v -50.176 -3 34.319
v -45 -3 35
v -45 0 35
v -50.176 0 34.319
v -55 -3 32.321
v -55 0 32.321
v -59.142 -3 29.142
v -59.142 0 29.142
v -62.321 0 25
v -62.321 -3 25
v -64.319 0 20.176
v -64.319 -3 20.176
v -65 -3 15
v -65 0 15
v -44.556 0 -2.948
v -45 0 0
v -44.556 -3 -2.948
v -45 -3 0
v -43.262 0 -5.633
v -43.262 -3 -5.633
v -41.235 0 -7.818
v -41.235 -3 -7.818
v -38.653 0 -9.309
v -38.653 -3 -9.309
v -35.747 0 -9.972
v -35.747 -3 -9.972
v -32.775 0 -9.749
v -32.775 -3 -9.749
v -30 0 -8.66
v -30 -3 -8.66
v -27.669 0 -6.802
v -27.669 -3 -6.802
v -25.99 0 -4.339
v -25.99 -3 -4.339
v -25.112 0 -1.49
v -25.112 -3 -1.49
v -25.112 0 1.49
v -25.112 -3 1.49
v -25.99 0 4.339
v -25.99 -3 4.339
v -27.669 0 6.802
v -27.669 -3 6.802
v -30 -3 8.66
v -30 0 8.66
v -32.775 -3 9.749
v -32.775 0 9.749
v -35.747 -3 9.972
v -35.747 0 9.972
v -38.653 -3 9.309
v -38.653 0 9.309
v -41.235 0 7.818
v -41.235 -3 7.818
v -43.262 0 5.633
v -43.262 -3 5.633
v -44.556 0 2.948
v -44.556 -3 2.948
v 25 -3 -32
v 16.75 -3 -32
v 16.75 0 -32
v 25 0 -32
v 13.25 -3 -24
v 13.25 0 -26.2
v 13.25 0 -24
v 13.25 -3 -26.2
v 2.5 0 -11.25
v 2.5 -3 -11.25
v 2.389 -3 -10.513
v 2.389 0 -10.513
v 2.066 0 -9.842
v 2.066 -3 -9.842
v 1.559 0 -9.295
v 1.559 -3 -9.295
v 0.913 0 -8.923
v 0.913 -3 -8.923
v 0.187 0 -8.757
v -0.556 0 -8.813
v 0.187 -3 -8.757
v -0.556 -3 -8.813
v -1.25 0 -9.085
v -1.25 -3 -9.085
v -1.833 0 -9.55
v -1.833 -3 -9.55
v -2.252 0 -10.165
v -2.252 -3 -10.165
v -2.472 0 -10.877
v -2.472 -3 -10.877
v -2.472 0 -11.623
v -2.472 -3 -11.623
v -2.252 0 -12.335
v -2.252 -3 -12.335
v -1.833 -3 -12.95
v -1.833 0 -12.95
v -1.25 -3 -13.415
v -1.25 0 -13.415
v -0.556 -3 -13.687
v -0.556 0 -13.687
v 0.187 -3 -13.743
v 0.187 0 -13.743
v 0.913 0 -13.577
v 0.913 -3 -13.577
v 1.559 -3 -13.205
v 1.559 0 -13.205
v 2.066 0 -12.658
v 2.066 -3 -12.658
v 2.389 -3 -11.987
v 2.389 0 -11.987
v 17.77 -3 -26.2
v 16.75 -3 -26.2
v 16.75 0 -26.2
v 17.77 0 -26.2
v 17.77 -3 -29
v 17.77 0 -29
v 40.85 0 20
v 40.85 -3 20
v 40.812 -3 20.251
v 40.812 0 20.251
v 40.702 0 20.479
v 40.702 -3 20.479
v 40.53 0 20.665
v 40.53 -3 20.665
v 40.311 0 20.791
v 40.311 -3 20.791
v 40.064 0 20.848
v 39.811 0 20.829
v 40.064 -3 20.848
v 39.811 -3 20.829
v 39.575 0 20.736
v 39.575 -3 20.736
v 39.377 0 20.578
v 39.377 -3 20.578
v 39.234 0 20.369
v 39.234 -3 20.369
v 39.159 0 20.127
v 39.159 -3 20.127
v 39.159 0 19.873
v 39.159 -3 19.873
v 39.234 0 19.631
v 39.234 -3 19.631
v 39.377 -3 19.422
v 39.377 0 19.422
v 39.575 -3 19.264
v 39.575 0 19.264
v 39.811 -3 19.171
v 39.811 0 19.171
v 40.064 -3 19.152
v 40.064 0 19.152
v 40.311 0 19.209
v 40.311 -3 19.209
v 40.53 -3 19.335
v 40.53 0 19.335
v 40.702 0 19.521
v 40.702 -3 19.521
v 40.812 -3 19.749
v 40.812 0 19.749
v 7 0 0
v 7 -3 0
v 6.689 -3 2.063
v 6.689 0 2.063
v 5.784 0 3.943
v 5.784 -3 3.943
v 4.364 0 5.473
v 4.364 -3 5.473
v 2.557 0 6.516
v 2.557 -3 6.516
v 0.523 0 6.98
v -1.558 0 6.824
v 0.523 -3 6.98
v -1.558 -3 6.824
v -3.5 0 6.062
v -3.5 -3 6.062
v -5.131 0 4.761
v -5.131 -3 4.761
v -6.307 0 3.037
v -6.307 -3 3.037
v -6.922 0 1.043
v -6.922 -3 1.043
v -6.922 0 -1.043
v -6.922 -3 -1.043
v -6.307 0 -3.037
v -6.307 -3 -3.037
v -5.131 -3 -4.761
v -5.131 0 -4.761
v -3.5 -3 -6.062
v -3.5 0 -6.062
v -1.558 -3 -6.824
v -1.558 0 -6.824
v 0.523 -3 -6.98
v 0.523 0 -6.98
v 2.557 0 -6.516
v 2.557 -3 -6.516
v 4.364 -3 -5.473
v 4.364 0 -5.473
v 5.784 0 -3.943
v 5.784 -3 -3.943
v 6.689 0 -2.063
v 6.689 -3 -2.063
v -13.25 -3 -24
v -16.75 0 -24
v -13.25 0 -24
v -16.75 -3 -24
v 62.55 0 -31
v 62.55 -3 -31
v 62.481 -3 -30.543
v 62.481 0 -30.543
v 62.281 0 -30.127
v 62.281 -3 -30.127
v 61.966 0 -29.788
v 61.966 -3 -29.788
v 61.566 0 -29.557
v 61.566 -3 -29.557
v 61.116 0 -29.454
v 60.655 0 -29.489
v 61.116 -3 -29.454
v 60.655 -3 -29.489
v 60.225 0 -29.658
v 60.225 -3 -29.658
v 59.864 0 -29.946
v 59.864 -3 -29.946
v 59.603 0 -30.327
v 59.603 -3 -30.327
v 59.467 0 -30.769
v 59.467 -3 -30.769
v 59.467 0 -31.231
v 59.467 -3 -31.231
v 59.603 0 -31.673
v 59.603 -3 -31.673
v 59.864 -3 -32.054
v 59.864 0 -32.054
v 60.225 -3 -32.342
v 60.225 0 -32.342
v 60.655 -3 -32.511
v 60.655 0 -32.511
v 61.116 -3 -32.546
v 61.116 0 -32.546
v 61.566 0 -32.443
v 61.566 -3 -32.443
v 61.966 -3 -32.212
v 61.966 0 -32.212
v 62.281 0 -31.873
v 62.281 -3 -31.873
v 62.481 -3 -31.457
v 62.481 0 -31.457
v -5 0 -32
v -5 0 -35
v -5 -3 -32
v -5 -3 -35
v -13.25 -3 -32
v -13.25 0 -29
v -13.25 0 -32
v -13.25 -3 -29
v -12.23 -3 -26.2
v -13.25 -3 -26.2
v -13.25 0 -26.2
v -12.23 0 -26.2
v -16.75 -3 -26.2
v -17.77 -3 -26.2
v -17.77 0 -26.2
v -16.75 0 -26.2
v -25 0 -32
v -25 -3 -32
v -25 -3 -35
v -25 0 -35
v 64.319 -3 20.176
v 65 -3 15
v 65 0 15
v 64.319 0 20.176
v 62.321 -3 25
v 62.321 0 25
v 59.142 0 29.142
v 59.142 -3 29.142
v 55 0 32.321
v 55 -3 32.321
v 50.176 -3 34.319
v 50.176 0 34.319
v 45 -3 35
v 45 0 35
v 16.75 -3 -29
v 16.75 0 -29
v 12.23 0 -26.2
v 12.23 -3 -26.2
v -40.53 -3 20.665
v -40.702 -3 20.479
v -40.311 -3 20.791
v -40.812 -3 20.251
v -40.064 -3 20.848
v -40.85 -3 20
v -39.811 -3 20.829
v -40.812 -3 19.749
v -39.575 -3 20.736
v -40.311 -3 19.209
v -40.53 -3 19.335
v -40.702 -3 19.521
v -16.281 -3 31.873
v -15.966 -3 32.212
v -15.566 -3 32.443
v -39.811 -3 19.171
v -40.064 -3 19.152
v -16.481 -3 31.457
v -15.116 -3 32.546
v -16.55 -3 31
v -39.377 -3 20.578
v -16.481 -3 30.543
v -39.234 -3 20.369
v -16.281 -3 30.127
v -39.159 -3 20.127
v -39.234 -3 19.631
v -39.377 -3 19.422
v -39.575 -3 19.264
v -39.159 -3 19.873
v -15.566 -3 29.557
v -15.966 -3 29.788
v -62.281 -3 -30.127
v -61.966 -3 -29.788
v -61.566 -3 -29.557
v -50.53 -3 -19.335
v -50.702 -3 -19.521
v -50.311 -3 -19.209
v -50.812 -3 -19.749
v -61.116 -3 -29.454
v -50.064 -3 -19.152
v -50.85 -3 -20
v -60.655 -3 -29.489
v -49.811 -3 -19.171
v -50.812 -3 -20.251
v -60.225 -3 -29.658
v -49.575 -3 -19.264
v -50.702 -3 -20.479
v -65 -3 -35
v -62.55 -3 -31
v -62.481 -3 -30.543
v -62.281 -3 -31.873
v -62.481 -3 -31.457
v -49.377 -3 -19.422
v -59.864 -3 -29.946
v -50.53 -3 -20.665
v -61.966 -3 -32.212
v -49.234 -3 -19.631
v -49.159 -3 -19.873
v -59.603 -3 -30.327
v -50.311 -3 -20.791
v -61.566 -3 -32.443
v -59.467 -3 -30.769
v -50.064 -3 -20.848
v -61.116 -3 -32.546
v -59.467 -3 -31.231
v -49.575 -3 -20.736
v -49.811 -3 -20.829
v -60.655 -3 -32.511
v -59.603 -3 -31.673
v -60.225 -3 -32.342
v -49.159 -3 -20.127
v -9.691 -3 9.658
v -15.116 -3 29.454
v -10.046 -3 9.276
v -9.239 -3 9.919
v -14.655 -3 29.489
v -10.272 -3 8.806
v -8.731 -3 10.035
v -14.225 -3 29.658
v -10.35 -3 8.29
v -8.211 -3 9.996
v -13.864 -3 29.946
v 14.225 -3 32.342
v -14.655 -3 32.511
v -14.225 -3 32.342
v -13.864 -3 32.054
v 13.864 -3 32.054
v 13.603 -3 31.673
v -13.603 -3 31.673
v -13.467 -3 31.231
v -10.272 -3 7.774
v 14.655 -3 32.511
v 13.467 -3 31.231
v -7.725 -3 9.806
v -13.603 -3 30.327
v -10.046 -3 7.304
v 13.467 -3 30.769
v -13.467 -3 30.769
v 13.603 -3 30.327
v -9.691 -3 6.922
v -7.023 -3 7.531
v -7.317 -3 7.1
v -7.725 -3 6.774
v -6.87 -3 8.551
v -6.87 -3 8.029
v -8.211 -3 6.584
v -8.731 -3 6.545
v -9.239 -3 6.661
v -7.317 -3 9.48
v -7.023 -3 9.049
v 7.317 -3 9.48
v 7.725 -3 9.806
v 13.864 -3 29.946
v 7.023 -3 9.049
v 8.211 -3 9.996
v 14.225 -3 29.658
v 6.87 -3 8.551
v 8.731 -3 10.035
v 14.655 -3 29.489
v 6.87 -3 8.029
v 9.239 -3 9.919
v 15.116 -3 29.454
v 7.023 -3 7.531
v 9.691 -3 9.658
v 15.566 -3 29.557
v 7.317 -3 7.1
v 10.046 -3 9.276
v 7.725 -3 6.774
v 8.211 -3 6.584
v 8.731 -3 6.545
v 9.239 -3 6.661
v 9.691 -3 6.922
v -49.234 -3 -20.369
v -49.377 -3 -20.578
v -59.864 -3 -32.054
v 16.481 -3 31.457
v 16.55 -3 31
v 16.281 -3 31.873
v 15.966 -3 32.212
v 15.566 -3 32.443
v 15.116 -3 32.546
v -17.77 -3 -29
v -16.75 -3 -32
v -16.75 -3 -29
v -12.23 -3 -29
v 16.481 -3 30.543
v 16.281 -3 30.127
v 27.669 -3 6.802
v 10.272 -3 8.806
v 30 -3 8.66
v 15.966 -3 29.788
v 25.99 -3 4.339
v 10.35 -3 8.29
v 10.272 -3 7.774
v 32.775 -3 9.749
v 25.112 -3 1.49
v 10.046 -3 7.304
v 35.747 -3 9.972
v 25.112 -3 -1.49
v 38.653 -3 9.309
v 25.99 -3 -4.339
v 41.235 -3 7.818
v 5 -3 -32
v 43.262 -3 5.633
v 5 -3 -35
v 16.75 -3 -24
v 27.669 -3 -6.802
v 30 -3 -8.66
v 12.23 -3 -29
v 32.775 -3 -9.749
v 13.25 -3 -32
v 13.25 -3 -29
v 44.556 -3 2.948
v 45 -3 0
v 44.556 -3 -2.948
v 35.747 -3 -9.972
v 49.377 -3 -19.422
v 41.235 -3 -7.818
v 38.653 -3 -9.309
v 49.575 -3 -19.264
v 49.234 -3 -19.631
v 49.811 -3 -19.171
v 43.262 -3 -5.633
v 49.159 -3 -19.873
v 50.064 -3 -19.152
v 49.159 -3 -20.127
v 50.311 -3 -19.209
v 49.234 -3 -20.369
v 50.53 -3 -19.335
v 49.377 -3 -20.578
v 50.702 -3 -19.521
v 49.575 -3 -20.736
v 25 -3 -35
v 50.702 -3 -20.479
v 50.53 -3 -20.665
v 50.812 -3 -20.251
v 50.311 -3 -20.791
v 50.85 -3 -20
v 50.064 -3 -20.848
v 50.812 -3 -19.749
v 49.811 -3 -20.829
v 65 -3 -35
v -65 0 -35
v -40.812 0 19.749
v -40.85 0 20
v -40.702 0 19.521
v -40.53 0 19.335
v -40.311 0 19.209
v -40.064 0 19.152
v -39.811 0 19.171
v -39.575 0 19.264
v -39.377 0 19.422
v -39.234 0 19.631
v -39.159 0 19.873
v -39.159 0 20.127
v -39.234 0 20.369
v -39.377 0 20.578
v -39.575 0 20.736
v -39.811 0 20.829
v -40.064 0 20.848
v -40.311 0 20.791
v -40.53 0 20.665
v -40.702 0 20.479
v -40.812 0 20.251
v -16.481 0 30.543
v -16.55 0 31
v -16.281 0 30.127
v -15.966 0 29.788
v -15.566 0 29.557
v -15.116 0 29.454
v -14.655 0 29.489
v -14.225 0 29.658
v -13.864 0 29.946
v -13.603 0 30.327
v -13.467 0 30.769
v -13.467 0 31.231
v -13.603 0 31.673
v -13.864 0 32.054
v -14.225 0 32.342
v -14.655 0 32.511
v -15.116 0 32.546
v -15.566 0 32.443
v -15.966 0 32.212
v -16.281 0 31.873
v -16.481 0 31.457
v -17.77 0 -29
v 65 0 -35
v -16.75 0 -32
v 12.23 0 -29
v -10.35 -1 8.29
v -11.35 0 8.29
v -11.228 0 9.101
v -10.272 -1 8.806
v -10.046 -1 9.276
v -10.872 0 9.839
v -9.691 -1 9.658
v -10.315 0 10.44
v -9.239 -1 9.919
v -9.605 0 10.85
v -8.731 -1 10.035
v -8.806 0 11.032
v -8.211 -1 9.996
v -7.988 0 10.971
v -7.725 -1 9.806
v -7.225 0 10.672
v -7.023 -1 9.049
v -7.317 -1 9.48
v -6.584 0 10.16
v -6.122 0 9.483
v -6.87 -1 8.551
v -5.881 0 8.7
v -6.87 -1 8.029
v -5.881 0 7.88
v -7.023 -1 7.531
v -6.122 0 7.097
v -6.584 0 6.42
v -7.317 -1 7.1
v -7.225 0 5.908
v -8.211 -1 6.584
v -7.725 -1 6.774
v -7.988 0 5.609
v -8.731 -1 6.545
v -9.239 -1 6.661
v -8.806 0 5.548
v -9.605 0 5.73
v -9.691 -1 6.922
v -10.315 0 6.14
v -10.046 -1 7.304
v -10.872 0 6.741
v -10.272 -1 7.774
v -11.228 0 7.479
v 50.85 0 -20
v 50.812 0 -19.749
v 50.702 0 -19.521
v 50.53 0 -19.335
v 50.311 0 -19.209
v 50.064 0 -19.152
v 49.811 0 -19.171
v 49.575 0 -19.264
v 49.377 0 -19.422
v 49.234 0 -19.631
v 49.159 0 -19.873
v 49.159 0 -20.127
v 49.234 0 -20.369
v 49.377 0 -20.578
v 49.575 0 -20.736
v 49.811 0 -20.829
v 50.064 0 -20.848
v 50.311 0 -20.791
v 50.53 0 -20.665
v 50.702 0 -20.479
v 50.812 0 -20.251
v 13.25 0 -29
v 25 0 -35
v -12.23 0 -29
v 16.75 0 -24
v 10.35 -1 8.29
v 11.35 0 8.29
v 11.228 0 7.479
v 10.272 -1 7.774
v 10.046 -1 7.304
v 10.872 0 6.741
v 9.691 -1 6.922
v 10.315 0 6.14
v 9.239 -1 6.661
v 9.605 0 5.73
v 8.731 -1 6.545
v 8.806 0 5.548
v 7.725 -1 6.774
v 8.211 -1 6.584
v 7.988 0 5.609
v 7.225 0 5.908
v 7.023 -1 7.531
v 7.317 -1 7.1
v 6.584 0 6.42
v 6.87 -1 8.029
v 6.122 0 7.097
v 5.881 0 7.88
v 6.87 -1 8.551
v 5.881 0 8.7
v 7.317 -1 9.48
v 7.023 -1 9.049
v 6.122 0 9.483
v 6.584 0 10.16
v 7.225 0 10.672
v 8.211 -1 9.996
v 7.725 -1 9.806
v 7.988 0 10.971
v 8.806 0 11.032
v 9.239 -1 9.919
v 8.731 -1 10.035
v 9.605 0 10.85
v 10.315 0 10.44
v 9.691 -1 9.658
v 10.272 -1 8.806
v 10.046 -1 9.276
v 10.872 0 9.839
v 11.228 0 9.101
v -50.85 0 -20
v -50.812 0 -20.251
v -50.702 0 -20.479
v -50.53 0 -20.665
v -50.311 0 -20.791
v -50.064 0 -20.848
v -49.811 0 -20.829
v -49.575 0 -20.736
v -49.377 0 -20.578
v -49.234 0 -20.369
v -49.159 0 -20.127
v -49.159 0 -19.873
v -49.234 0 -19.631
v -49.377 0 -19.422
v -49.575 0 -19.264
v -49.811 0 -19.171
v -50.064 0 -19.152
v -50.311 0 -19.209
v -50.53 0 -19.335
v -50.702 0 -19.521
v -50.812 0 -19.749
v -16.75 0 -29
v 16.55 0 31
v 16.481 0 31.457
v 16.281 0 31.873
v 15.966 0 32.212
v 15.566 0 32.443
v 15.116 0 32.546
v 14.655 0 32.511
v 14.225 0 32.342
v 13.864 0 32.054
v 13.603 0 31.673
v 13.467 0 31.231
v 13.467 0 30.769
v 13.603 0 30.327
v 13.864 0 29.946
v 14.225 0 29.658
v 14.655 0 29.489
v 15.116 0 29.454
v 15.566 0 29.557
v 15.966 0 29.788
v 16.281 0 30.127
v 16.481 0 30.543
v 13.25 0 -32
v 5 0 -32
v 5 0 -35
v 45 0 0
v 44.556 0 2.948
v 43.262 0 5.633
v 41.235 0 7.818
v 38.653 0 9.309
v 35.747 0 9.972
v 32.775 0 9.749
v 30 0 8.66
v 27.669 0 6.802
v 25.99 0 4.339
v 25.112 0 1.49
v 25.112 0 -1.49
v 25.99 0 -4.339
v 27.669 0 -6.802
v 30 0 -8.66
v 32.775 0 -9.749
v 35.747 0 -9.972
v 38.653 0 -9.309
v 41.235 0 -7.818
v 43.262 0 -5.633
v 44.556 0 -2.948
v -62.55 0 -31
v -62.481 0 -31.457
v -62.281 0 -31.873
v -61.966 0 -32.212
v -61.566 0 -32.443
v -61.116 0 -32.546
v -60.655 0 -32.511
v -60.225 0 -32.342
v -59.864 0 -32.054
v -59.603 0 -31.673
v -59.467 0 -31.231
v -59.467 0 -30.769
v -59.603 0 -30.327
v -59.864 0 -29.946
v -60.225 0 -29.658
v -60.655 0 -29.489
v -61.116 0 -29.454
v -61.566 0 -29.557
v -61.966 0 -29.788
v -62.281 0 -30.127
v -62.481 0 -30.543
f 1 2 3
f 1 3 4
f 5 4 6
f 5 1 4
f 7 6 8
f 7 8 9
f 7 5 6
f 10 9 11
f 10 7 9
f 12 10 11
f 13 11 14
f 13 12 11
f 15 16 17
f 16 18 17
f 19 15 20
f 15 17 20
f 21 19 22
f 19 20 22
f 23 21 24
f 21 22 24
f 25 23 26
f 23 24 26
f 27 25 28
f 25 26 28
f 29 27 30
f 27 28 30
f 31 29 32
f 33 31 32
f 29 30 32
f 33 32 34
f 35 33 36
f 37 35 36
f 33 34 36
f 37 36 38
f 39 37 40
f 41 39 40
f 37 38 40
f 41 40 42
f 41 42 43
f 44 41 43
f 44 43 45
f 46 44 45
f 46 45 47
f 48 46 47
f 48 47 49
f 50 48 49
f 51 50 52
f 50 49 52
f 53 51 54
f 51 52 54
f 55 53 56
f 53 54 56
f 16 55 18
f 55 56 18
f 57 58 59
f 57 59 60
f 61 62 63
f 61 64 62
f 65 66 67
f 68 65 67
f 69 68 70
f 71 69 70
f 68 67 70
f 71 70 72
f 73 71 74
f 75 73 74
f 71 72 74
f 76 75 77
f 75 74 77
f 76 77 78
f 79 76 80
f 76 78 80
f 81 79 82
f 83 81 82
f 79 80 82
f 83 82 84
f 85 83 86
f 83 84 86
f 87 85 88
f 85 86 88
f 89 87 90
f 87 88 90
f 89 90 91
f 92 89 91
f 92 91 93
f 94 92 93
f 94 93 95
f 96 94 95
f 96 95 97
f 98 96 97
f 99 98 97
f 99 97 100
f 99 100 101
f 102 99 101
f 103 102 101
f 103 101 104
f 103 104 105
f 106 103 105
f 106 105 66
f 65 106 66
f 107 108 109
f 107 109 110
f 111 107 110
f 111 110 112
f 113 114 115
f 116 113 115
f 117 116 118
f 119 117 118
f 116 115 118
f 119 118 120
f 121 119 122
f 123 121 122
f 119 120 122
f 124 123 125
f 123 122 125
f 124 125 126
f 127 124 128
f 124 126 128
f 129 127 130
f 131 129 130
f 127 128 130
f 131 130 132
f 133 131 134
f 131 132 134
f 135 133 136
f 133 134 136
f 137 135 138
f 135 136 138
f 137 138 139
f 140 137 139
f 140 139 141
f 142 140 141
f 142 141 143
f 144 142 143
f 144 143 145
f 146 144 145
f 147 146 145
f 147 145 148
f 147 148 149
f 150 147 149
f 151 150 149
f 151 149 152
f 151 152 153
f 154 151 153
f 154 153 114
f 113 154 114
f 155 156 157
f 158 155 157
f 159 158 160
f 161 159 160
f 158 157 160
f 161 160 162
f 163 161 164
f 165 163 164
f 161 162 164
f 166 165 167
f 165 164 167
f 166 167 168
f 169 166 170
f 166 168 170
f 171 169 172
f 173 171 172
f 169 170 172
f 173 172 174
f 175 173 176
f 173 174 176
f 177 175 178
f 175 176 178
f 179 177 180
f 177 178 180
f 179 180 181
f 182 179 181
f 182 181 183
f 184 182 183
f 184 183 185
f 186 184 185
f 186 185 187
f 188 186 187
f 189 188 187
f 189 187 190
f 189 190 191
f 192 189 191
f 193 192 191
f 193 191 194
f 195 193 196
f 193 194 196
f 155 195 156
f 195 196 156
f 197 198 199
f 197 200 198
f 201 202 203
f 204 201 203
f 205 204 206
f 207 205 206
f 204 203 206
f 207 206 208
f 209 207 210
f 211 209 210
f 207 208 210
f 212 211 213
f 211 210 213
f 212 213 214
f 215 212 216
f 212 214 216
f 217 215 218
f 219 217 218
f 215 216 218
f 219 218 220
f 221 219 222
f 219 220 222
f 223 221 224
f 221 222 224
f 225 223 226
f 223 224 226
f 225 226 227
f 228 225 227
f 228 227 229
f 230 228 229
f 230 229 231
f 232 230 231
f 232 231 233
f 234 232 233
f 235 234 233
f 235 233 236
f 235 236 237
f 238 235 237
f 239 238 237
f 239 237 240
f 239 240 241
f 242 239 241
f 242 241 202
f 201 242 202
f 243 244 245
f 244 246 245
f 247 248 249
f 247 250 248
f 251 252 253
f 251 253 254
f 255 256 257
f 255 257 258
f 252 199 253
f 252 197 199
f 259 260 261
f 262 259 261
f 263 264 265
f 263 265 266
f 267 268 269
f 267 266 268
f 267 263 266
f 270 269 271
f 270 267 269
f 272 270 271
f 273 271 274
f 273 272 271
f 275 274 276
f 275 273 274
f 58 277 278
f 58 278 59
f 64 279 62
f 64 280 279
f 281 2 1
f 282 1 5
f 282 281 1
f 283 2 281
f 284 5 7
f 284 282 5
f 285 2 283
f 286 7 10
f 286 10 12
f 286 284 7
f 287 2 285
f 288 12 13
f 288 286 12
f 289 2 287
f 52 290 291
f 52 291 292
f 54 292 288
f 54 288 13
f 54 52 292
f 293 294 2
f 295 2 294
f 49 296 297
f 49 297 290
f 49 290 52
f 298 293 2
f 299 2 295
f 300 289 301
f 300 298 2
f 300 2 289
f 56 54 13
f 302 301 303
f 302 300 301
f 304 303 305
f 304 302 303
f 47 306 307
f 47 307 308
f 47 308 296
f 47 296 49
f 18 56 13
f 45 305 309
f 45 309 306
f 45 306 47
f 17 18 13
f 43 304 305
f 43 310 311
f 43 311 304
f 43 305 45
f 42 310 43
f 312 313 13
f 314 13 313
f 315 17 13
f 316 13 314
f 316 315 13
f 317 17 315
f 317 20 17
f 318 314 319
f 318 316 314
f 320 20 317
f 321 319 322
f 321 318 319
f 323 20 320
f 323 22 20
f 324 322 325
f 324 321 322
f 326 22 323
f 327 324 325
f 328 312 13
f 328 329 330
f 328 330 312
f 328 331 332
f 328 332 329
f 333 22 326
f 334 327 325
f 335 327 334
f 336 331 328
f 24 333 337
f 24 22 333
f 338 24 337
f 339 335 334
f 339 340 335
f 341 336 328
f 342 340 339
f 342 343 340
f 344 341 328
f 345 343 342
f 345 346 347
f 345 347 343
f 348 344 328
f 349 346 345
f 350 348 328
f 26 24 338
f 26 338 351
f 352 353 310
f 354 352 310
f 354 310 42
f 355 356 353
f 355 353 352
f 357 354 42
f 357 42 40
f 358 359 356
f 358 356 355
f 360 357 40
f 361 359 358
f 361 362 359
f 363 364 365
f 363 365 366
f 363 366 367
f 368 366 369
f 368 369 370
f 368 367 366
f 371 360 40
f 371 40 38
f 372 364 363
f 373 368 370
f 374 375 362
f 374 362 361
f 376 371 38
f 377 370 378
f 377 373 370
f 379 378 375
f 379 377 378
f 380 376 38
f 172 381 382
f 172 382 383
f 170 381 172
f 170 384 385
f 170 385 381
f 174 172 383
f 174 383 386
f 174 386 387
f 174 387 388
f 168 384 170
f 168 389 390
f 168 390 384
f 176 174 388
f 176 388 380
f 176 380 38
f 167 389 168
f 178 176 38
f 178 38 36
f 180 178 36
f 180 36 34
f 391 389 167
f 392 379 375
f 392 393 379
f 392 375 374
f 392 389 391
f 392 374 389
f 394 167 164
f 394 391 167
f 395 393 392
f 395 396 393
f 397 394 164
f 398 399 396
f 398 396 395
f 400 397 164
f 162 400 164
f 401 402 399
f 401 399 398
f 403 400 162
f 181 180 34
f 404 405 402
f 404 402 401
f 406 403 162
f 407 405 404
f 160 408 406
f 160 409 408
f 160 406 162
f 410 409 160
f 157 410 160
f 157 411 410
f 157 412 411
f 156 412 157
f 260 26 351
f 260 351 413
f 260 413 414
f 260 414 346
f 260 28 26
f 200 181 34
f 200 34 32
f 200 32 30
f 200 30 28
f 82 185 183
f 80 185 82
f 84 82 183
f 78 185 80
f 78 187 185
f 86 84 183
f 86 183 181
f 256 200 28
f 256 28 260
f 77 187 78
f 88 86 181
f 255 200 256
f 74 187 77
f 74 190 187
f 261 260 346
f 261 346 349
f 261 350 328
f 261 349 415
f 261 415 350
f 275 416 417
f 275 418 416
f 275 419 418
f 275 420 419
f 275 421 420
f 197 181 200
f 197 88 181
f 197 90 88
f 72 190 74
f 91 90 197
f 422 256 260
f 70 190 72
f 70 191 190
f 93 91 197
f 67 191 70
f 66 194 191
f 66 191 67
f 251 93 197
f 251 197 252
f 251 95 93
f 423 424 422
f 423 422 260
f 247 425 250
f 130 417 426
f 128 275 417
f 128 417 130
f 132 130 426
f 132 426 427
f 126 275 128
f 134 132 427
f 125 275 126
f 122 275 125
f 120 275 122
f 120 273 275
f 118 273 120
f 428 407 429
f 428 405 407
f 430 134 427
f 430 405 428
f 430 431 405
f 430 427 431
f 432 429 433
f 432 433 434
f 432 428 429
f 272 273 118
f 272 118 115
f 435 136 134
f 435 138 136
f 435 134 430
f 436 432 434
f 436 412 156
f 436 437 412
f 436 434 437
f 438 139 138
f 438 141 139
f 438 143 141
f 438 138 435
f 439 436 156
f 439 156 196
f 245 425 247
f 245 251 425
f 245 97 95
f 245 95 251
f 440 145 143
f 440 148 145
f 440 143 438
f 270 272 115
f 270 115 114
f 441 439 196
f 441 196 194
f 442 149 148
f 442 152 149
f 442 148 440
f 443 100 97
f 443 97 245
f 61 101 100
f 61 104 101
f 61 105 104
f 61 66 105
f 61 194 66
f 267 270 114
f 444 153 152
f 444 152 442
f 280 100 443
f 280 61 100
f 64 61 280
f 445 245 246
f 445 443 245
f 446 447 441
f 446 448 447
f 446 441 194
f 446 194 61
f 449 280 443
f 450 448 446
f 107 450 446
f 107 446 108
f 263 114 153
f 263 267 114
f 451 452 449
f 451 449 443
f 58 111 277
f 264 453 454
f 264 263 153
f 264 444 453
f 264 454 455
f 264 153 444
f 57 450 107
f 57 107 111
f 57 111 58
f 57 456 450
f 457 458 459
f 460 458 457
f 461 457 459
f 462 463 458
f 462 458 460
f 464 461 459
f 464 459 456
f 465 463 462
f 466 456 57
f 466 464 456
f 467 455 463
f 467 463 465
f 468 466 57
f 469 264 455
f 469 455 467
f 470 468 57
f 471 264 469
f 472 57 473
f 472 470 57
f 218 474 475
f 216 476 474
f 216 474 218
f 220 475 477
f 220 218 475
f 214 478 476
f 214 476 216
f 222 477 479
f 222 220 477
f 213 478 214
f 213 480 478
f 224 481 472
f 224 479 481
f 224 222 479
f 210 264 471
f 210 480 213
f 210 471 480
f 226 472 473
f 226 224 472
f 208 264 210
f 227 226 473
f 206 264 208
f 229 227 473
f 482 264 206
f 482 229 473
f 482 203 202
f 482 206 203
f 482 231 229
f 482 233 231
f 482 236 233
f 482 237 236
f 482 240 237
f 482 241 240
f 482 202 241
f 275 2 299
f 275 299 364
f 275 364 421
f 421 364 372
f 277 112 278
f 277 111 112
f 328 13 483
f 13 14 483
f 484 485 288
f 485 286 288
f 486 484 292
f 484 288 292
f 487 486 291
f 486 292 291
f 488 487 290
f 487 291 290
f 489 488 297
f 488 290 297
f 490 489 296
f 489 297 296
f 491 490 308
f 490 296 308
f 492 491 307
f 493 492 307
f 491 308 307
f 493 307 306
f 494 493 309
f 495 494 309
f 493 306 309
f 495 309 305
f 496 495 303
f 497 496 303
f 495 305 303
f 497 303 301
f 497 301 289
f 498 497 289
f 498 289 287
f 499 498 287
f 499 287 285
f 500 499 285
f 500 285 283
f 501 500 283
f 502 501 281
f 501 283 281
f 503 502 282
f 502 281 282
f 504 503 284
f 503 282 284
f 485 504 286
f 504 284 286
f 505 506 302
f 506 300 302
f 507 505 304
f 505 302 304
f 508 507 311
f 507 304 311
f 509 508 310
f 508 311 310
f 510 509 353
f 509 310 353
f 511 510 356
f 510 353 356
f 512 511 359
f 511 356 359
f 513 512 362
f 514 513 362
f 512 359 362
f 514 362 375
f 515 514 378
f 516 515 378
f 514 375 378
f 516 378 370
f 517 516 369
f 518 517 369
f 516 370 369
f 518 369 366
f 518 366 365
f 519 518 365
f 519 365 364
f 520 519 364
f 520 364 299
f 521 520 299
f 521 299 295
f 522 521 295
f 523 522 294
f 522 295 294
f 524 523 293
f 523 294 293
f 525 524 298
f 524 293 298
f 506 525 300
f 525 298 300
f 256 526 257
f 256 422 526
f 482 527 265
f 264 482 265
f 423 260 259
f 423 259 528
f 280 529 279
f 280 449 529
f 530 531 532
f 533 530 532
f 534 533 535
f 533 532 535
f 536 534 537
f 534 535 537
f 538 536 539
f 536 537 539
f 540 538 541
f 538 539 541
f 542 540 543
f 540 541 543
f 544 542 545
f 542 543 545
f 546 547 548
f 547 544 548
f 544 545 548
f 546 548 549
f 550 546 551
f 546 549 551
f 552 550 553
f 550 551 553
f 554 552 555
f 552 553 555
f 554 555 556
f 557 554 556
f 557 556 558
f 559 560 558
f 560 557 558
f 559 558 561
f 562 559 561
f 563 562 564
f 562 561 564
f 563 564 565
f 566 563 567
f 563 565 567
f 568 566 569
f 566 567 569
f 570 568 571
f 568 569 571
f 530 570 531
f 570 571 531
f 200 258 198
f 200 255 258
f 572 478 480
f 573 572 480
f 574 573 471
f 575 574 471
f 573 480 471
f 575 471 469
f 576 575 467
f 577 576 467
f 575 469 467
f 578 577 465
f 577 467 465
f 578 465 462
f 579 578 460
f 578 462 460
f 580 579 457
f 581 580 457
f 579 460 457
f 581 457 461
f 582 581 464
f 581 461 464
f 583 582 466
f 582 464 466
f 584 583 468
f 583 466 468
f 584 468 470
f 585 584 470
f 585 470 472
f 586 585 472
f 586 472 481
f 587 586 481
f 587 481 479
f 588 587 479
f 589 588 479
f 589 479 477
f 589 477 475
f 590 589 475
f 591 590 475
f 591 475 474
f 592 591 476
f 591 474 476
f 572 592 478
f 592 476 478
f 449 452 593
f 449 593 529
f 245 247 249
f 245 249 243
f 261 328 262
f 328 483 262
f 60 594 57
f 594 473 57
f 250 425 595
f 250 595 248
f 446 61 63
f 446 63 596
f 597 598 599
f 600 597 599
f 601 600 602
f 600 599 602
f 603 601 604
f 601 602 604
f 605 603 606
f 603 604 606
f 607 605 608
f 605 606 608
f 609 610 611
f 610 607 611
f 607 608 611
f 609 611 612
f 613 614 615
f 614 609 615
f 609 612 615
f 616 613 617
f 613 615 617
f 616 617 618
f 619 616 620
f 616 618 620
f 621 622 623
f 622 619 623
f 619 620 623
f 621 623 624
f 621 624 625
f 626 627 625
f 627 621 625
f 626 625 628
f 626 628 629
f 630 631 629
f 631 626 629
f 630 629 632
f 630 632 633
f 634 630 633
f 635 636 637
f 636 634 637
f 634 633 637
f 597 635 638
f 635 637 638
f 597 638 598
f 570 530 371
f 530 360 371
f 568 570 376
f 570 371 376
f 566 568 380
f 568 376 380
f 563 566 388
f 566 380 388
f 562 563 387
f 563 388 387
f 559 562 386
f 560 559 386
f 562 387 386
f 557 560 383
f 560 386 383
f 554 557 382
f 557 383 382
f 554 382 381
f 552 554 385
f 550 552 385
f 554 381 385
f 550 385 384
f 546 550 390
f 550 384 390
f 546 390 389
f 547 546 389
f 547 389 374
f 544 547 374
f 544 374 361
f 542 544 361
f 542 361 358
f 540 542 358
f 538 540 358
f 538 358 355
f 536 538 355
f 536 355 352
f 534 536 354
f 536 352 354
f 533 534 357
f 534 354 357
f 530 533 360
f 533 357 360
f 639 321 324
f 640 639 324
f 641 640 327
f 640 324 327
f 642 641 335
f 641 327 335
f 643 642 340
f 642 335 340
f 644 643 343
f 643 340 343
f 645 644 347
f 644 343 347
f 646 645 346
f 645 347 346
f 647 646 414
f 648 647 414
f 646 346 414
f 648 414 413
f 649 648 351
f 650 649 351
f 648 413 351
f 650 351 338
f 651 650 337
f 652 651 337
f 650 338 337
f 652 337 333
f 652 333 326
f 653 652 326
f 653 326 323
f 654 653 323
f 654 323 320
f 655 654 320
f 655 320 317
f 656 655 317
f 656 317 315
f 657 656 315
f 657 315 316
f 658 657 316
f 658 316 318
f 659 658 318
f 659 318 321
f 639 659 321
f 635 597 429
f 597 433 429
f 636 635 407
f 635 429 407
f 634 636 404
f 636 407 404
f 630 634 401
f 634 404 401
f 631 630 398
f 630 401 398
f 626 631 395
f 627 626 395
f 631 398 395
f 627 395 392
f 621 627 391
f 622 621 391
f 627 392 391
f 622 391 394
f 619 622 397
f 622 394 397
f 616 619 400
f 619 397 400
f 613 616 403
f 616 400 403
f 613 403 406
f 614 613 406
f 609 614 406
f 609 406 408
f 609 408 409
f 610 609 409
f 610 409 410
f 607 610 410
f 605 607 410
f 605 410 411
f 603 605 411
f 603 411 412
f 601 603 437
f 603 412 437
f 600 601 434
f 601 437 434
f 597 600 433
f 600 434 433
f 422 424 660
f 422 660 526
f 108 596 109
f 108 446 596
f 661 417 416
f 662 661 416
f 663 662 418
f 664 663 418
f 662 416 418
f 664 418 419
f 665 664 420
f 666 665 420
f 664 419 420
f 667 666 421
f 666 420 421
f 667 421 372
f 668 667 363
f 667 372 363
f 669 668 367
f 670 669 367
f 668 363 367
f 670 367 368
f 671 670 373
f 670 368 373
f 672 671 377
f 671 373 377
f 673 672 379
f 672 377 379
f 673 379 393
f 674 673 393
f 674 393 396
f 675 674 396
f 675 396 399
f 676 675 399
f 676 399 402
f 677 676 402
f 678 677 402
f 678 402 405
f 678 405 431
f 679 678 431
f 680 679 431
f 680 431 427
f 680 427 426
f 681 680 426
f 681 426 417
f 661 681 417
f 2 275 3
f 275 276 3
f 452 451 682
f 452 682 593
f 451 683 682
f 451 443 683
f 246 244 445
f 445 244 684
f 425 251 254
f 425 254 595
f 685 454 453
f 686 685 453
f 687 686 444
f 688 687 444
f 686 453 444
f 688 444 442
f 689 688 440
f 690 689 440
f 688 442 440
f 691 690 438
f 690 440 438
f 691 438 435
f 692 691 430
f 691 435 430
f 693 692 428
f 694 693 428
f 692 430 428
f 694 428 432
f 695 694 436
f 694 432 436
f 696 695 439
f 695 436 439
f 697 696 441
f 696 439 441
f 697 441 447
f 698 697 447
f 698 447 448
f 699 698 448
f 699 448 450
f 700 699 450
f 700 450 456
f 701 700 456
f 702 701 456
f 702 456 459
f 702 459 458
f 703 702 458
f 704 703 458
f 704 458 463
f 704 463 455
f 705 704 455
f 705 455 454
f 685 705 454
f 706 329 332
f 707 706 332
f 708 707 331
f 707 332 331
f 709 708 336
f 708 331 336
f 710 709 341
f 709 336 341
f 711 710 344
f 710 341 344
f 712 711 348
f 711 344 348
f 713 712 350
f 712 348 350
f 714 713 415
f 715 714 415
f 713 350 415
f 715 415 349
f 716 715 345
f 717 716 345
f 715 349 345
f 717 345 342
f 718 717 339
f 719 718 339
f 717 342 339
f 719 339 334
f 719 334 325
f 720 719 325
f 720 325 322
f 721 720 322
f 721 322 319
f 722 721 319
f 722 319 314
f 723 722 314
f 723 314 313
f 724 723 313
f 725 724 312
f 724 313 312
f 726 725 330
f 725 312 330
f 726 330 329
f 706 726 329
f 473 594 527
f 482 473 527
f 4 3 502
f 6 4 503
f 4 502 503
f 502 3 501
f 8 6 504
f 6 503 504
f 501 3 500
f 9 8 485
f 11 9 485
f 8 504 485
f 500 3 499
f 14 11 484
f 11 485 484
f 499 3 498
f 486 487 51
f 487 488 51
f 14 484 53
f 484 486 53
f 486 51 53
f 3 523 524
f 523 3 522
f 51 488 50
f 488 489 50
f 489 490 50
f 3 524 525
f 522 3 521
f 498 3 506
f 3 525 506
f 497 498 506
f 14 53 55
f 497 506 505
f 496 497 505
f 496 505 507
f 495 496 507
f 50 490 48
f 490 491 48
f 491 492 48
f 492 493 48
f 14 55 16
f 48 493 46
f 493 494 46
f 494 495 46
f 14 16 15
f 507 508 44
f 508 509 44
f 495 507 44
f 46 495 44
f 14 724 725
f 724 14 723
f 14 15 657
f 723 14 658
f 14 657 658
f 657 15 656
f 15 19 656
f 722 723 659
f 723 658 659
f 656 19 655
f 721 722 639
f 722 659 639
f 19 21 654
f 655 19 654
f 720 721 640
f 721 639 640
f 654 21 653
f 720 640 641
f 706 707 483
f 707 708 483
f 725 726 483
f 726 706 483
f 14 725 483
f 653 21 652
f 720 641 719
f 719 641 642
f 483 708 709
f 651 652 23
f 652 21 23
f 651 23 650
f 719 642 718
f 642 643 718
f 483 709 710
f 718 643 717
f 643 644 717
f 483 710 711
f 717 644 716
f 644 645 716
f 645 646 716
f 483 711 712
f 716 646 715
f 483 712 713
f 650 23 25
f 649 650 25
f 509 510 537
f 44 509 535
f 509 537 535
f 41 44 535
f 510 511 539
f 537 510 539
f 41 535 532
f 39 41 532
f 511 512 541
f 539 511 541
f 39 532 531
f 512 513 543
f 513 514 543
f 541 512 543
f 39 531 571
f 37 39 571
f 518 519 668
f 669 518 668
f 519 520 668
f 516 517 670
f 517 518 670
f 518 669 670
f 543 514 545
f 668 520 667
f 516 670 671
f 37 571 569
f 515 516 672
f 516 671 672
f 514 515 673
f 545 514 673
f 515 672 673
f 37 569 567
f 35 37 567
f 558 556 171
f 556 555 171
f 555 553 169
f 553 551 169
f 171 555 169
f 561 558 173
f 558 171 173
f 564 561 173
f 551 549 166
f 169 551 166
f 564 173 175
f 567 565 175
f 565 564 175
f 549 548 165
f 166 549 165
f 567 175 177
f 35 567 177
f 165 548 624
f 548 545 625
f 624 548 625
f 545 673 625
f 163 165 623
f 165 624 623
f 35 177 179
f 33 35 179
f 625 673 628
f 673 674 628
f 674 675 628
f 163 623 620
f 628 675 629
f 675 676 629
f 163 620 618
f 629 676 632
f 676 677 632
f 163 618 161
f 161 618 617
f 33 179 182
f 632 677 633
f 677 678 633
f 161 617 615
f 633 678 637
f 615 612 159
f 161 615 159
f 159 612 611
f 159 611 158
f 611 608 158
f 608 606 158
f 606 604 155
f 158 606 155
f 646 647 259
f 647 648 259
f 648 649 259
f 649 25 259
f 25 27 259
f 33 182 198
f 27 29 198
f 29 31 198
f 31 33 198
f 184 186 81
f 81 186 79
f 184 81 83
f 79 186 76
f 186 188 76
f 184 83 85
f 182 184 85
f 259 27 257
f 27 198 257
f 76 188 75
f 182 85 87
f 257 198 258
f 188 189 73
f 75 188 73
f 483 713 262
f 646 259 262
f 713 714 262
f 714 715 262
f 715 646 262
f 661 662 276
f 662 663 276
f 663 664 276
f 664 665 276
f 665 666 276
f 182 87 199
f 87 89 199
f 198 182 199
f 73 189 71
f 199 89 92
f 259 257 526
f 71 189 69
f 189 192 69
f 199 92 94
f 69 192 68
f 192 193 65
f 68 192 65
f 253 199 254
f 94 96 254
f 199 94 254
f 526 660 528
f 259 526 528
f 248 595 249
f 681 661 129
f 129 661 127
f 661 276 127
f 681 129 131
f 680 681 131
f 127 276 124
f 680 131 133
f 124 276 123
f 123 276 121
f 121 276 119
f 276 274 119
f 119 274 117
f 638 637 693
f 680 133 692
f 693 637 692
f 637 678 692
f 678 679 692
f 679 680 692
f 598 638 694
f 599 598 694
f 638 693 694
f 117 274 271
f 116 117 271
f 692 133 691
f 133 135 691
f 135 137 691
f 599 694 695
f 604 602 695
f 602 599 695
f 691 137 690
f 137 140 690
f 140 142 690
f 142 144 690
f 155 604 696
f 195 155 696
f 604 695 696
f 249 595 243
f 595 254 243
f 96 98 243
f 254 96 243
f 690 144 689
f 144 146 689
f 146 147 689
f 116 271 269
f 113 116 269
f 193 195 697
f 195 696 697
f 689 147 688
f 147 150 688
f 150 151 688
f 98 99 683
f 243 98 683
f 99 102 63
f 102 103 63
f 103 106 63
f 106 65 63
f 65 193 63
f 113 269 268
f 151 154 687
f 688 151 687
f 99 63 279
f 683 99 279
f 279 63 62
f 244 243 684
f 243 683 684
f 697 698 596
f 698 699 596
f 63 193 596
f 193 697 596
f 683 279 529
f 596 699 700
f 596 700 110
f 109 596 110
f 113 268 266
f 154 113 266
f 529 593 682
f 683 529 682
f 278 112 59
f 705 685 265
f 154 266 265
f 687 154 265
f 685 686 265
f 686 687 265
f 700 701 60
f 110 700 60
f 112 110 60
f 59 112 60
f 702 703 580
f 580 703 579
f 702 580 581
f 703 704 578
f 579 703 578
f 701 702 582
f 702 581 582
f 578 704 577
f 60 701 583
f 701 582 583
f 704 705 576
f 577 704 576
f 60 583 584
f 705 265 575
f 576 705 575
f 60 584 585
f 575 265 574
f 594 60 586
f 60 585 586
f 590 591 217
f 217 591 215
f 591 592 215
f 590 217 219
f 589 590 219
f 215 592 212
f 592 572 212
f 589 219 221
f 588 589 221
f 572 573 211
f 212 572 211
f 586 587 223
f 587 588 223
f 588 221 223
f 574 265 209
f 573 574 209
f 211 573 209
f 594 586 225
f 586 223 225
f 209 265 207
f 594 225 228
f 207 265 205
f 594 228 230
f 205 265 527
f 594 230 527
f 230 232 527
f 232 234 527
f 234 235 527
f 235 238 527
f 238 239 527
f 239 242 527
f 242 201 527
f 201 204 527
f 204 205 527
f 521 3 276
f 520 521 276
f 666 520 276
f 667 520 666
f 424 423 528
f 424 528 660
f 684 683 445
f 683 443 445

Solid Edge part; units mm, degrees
sketch "Sketch1" plane through (0, 0, 0) normal (0, -1, 0) x (1, 0, 0)
  line L0 (-65, -35) -> (65, -35)
  line L1 (65, -35) -> (65, 35)
  line L2 (65, 35) -> (-65, 35)
  line L3 (-65, 35) -> (-65, -35)
  dimension "D1" = 130
  dimension "D2" = 70
extrude "Ajout_matière_1" add sketch "Sketch1" along normal blind 3
sketch "Sketch2" plane through (0, -3, 0) normal (0, -1, 0) x (1, 0, 0)
  circle A0 centre (35, 0) radius 10
  dimension "D1" = 20
  dimension "D2" = 35
extrude "Enlèvement_matière_1" cut sketch "Sketch2" against normal blind 203.2796
sketch "Sketch3" plane through (0, -3, 0) normal (0, -1, 0) x (1, 0, 0)
  circle A0 centre (40, 20) radius 0.85
  circle A1 centre (15, 31) radius 1.55
  circle A2 centre (61, -31) radius 1.55
  circle A3 centre (50, -20) radius 0.85
  circle A4 centre (8.6, 8.29) radius 1.75
  dimension "D1" = 25
  dimension "D2" = 20
  dimension "D3" = 1.7
  dimension "D4" = 20
  dimension "D5" = 15
  dimension "D6" = 1.7
  dimension "D7" = 3.1
  dimension "D8" = 15
  dimension "D9" = 4
  dimension "D10" = 3.1
  dimension "D11" = 4
  dimension "D12" = 4
  dimension "D13" = 3.5
  dimension "D14" = 8.6
  dimension "D15" = 8.29
extrude "Enlèvement_matière_2" cut sketch "Sketch3" against normal blind 33.5111
sketch "Sketch4" plane through (0, -3, 0) normal (0, -1, 0) x (1, 0, 0)
  line L0 (5, -38) -> (25, -38)
  line L1 (25, -38) -> (25, -32)
  line L2 (16.75, -32) -> (25, -32)
  line L3 (16.75, -29) -> (16.75, -32)
  line L4 (17.77, -29) -> (16.75, -29)
  line L5 (17.77, -26.2) -> (17.77, -29)
  line L6 (16.75, -26.2) -> (17.77, -26.2)
  line L7 (16.75, -24) -> (16.75, -26.2)
  line L8 (13.25, -24) -> (16.75, -24)
  line L9 (13.25, -26.2) -> (13.25, -24)
  line L10 (12.23, -26.2) -> (13.25, -26.2)
  line L11 (12.23, -29) -> (12.23, -26.2)
  line L12 (13.25, -29) -> (12.23, -29)
  line L13 (13.25, -32) -> (13.25, -29)
  line L14 (5, -32) -> (13.25, -32)
  line L15 (5, -32) -> (5, -38)
  dimension "D1" = 6
  dimension "D2" = 5
  dimension "D3" = 20
  dimension "D4" = 1.02
  dimension "D5" = 8
  dimension "D6" = 3
  dimension "D7" = 8.25
  dimension "D8" = 2.8
  dimension "D9" = 5.54
extrude "Cutout1" cut sketch "Sketch4" against normal blind 6.6007
mirror "Mirror1" about plane through (0, 0, 0) normal (1, 0, 0) of "Enlèvement_matière_1", "Enlèvement_matière_2", "Cutout1"
fillet "Congé_1" radius 20 1 edges at (65, -1.5, 35)
fillet "Round1" radius 20 1 edges at (-65, -1.5, 35)
sketch "Sketch5" plane through (0, -3, 0) normal (0, -1, 0) x (1, 0, 0)
  circle A0 centre (0, 0) radius 7
  circle A1 centre (0, -11.25) radius 2.5
  dimension "D1" = 14
  dimension "D2" = 5
  dimension "D3" = 11.25
extrude "Enlèvement_matière_8" cut sketch "Sketch5" against normal blind 3.6745
chamfer "Chamfer1" distance 1 angle 45 2 edges at (-8.6, 0, 10.04) (8.6, 0, 10.04)
properties part number "07" material "MDF 3mm"
